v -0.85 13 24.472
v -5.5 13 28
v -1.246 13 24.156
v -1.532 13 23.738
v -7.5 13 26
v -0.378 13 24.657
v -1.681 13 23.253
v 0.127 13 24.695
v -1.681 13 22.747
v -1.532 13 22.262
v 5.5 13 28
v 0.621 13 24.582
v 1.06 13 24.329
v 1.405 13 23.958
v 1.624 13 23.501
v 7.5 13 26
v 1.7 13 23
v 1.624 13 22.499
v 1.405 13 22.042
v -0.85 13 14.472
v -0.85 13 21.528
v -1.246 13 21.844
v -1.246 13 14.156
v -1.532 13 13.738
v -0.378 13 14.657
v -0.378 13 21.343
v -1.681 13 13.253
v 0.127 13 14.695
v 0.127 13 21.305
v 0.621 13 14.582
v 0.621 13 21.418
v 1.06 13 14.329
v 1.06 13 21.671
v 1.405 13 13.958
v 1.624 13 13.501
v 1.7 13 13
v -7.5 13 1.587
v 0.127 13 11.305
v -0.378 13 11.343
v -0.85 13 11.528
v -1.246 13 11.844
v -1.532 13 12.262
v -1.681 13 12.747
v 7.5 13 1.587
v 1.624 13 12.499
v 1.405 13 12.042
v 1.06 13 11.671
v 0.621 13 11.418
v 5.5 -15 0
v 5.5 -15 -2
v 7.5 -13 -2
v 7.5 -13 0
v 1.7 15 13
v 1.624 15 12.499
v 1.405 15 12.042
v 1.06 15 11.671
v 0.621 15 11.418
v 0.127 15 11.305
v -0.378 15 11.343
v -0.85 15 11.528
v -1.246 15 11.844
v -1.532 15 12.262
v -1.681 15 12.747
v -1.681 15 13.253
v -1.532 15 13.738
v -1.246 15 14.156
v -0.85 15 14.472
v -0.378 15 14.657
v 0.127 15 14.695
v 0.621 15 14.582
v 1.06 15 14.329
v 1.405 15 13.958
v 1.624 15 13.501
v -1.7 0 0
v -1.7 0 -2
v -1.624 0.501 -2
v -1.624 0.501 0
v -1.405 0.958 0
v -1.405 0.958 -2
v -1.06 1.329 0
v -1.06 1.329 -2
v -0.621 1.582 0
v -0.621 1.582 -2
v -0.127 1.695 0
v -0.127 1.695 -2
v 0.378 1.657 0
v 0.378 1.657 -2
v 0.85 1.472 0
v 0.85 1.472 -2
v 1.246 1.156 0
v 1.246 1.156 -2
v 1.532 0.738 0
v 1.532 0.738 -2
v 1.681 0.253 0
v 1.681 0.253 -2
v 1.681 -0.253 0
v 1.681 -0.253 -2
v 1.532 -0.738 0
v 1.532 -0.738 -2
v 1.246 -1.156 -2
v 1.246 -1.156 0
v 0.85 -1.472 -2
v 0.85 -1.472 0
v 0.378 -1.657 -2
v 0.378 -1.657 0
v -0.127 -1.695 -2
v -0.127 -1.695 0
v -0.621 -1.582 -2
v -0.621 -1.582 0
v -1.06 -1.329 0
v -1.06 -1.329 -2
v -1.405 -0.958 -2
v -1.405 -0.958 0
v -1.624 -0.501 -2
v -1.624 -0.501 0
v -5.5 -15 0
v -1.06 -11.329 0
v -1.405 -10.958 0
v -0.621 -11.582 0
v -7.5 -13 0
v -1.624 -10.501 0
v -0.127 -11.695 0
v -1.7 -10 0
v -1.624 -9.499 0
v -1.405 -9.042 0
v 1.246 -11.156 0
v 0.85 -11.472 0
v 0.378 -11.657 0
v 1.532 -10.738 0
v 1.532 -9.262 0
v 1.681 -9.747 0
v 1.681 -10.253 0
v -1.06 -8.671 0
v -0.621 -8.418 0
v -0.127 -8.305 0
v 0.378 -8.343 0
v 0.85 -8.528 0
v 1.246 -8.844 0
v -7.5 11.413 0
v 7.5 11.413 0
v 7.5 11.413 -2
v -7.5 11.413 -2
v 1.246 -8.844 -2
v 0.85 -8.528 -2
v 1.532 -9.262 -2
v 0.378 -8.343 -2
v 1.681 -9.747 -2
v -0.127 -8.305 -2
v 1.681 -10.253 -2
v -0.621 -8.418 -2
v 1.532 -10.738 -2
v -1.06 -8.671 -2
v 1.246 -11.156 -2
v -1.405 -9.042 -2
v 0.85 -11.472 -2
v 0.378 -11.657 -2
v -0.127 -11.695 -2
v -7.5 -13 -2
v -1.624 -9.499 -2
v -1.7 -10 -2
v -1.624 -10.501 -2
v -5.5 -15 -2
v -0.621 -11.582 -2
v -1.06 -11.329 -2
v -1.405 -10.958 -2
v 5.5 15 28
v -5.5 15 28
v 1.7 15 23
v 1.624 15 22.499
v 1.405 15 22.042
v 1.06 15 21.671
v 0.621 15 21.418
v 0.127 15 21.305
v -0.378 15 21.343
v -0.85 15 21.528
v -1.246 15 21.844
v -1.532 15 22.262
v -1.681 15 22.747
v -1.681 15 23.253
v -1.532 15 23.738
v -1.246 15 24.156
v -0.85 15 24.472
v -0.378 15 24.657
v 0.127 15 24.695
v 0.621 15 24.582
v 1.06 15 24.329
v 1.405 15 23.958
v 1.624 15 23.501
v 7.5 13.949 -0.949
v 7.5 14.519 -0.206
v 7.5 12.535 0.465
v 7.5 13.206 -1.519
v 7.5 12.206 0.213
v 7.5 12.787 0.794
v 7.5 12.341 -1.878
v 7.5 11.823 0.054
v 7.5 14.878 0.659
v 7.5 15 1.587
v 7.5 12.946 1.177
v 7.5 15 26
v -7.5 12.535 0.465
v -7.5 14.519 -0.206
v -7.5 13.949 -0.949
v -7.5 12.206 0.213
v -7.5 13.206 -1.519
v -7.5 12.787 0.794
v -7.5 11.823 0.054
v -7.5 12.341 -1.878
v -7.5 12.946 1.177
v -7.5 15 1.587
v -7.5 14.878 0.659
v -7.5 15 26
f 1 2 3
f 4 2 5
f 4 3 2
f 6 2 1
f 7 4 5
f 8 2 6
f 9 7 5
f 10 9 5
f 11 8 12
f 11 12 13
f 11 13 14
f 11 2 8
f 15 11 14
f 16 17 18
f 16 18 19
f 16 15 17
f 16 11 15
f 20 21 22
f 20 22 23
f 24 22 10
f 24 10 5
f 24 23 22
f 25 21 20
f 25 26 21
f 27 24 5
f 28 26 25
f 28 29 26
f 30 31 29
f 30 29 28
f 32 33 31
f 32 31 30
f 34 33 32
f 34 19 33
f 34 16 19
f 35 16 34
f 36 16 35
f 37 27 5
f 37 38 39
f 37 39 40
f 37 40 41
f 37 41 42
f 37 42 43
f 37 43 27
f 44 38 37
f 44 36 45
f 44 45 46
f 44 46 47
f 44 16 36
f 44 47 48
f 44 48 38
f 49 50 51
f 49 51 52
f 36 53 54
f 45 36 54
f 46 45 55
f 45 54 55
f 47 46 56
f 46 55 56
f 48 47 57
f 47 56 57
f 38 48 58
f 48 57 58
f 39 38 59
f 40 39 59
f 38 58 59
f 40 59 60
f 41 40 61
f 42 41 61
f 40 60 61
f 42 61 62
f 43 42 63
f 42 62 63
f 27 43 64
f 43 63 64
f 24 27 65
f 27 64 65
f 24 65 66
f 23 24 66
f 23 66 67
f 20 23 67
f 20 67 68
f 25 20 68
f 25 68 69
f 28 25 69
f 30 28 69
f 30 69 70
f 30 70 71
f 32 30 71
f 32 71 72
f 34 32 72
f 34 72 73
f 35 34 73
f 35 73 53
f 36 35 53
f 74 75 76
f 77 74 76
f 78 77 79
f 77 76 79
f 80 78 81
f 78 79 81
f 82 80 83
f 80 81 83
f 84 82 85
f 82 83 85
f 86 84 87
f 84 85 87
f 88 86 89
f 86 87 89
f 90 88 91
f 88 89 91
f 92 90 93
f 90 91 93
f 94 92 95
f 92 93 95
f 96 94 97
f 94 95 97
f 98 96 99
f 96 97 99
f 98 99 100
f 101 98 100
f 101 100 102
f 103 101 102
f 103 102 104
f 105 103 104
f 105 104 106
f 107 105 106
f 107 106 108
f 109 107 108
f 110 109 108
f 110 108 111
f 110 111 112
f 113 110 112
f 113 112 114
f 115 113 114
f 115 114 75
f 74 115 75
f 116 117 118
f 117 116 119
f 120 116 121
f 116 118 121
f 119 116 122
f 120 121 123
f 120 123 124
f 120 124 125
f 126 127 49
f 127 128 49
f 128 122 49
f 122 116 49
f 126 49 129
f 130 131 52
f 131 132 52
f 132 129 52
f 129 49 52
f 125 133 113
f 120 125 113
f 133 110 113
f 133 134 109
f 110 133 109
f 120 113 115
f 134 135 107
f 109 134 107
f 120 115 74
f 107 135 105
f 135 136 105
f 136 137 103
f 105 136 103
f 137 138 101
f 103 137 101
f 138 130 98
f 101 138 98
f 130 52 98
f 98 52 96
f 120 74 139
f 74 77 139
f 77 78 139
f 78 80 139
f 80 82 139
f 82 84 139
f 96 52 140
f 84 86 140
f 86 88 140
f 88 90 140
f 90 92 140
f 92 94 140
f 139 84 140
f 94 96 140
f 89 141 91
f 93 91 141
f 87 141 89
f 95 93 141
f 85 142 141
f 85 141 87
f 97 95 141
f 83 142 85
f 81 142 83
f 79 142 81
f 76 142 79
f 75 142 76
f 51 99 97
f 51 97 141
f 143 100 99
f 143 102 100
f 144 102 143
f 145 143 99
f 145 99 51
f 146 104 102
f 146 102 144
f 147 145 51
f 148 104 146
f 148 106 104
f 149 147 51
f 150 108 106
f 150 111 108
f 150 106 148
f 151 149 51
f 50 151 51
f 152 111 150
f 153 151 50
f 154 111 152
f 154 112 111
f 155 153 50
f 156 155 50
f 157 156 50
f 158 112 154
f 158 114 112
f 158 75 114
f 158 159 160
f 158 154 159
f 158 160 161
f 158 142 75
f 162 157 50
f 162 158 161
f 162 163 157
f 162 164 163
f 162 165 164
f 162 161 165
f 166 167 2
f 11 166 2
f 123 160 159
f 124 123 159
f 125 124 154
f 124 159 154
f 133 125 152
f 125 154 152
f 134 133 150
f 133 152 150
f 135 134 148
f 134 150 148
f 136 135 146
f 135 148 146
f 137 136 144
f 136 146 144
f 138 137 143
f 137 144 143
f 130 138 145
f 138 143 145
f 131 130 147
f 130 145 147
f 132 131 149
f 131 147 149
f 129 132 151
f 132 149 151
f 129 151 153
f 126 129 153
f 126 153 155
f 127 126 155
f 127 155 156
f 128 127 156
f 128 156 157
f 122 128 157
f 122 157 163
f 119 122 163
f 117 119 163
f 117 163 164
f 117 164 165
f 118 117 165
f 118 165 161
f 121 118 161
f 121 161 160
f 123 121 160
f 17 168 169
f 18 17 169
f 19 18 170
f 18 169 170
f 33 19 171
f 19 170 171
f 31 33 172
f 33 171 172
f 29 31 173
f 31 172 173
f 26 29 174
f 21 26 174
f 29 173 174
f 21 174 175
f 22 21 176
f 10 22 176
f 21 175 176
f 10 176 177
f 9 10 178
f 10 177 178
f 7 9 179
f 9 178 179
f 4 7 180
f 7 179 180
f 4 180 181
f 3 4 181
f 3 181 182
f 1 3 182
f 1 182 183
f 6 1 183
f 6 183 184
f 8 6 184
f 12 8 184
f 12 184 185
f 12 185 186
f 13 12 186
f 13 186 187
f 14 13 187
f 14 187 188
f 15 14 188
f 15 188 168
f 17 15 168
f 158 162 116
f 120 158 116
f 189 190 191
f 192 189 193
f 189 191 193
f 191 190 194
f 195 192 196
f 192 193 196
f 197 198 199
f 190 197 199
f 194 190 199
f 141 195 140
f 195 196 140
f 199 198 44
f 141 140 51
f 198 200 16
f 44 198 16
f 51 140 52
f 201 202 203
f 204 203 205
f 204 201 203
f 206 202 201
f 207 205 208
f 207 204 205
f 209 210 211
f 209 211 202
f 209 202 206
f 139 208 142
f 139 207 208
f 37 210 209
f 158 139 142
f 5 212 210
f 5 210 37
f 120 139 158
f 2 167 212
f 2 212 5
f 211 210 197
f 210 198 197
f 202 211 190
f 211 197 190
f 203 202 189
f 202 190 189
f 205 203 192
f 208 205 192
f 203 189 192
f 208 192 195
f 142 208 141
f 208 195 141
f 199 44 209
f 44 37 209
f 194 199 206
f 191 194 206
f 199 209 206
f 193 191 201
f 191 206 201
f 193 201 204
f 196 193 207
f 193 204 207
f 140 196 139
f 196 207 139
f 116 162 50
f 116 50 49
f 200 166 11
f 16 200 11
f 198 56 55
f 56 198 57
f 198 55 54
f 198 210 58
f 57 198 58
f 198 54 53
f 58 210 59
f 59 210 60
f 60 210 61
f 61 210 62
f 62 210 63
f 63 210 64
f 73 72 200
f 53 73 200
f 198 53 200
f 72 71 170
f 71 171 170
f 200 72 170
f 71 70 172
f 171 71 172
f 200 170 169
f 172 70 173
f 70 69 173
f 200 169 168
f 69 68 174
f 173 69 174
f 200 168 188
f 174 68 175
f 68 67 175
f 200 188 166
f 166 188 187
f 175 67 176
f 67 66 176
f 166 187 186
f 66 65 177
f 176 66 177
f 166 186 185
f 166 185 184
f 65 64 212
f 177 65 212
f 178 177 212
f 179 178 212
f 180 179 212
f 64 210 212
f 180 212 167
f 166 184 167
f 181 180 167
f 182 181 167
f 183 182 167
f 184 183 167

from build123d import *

# Parameters (mm, degrees)
SKETCH1_W                      = 30
SKETCH1_H                      = 30
BOSS_EXTRUDE1_DEPTH            = 15
SKETCH2_W                      = 28
SKETCH2_H                      = 28
CUT_EXTRUDE1_DEPTH             = 16
F_3_4_3_4_DIAMETER_HOLE1_D     = 3.4
F_3_4_3_4_DIAMETER_HOLE1_DEPTH = 2
F_3_4_3_4_DIAMETER_HOLE2_D     = 3.4
F_3_4_3_4_DIAMETER_HOLE2_DEPTH = 2
CHAMFER1_SIZE                  = 2
FILLET1_R                      = 1.5875
FILLET2_R                      = 3.5875


with BuildPart() as part:
    # Sketch1 → Boss-Extrude1 (new body)
    with BuildSketch(Plane(origin=(-7.5, 0, 0), x_dir=(0, -1, 0), z_dir=(-1, 0, 0))):
        with Locations((0, 13)):
            Rectangle(SKETCH1_W, SKETCH1_H)
    extrude(amount=-BOSS_EXTRUDE1_DEPTH)

    # Sketch2 → Cut-Extrude1 (cut, through all)
    with BuildSketch(Plane(origin=(7.5, 0, 0), x_dir=(0, 0, -1), z_dir=(1, 0, 0))):
        with Locations((-14, -1)):
            Rectangle(SKETCH2_W, SKETCH2_H)
    extrude(amount=-CUT_EXTRUDE1_DEPTH, mode=Mode.SUBTRACT)

    # Ø3.4 (3.4) Diameter Hole1
    with Locations(Plane.XY):
        with Locations((0, 0), (0, -10)):
            Hole(F_3_4_3_4_DIAMETER_HOLE1_D / 2, depth=F_3_4_3_4_DIAMETER_HOLE1_DEPTH)

    # Ø3.4 (3.4) Diameter Hole2
    with Locations(Plane(origin=(0, 13, 0), x_dir=(-1, 0, 0), z_dir=(0, -1, 0))):
        with Locations((0, -13), (0, -23)):
            Hole(F_3_4_3_4_DIAMETER_HOLE2_D / 2, depth=F_3_4_3_4_DIAMETER_HOLE2_DEPTH)

    # Chamfer1
    chamfer1_edges = [part.edges().sort_by_distance(p)[0] for p in [
        (-7.5, 14, 28),
        (7.5, 14, 28),
        (-7.5, -15, -1),
        (7.5, -15, -1),
    ]]
    chamfer(chamfer1_edges, length=CHAMFER1_SIZE)

    # Fillet1
    fillet1_edges = [part.edges().sort_by_distance(p)[0] for p in [
        (0, 13, 0),
    ]]
    fillet(fillet1_edges, radius=FILLET1_R)

    # Fillet2
    fillet2_edges = [part.edges().sort_by_distance(p)[0] for p in [
        (0, 15, -2),
    ]]
    fillet(fillet2_edges, radius=FILLET2_R)


solid = part.part
